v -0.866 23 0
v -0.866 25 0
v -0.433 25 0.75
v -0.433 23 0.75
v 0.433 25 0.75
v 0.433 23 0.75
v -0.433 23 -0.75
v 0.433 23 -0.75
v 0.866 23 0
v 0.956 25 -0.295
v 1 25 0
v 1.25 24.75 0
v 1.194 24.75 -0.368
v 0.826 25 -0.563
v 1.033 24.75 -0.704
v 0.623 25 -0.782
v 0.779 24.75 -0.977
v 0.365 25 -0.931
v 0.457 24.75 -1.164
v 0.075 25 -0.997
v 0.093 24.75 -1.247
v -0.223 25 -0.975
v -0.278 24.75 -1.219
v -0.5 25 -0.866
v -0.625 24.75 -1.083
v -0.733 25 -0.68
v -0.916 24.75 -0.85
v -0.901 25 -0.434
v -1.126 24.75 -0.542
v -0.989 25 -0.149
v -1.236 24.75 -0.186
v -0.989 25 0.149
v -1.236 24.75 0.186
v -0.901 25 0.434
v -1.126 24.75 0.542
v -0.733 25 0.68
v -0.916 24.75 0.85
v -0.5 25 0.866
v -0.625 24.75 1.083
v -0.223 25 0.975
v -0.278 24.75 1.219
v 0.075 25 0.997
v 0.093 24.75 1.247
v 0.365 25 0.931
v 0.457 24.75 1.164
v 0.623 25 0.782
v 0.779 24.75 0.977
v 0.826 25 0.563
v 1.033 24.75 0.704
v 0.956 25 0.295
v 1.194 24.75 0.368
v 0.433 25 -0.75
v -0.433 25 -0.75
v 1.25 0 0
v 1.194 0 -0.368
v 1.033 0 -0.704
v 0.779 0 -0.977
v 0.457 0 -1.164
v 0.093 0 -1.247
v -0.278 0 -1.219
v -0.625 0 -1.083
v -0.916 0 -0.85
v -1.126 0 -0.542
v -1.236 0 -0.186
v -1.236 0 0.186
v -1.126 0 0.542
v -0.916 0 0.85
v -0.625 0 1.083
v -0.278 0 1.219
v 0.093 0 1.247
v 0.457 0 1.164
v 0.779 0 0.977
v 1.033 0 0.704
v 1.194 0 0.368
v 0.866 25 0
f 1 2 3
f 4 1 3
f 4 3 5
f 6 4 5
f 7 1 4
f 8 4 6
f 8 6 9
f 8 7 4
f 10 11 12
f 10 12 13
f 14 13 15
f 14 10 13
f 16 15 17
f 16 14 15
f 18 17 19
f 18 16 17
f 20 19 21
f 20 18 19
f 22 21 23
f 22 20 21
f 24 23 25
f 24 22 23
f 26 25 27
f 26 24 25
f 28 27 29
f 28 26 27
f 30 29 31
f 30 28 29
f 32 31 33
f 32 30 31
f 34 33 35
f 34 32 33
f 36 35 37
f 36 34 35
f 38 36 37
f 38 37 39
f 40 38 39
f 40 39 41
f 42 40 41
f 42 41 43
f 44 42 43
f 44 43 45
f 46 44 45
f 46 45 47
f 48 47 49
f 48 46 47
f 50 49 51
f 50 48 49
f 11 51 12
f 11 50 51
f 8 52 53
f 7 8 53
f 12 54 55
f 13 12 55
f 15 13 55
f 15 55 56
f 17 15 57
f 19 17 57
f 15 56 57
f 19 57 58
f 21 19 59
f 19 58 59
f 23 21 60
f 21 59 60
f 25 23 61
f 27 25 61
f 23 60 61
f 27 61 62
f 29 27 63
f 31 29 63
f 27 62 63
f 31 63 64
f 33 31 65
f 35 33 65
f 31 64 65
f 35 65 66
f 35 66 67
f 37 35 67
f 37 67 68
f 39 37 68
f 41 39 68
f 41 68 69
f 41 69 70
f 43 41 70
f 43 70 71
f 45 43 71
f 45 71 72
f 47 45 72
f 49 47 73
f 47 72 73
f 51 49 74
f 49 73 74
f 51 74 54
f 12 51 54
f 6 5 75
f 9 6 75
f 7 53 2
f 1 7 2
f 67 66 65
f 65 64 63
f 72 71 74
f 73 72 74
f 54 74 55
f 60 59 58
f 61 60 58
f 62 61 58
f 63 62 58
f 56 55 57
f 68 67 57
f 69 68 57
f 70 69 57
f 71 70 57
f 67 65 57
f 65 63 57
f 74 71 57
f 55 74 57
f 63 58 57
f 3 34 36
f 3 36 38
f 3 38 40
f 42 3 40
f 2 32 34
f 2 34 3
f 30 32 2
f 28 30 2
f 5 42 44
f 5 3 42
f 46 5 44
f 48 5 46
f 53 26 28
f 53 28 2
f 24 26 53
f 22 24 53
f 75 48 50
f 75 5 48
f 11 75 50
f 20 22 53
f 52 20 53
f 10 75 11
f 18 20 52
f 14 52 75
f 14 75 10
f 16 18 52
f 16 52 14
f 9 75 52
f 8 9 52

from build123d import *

# Parameters (mm, degrees)
SKETCH1_R           = 1.25
BOSS_EXTRUDE1_DEPTH = 25
CUT_EXTRUDE1_DEPTH  = 2
CHAMFER1_SIZE       = 0.25


with BuildPart() as part:
    # Sketch1 → Boss-Extrude1 (new body)
    with BuildSketch(Plane(origin=(0, 0, 0), x_dir=(1, 0, 0), z_dir=(0, 1, 0))):
        Circle(SKETCH1_R)
    extrude(amount=BOSS_EXTRUDE1_DEPTH)

    # Sketch2 → Cut-Extrude1 (cut)
    with BuildSketch(Plane(origin=(0, 25, 0), x_dir=(1, 0, 0), z_dir=(0, 1, 0))):
        Polygon((0.866025404, 0), (0.433012702, 0.75), (-0.433012702, 0.75), (-0.866025404, 0), (-0.433012702, -0.75), (0.433012702, -0.75), align=None)
    extrude(amount=-CUT_EXTRUDE1_DEPTH, mode=Mode.SUBTRACT)

    # Chamfer1
    chamfer1_edges = [part.edges().sort_by_distance(p)[0] for p in [
        (-1.25, 25, 0),
    ]]
    chamfer(chamfer1_edges, length=CHAMFER1_SIZE)


solid = part.part
